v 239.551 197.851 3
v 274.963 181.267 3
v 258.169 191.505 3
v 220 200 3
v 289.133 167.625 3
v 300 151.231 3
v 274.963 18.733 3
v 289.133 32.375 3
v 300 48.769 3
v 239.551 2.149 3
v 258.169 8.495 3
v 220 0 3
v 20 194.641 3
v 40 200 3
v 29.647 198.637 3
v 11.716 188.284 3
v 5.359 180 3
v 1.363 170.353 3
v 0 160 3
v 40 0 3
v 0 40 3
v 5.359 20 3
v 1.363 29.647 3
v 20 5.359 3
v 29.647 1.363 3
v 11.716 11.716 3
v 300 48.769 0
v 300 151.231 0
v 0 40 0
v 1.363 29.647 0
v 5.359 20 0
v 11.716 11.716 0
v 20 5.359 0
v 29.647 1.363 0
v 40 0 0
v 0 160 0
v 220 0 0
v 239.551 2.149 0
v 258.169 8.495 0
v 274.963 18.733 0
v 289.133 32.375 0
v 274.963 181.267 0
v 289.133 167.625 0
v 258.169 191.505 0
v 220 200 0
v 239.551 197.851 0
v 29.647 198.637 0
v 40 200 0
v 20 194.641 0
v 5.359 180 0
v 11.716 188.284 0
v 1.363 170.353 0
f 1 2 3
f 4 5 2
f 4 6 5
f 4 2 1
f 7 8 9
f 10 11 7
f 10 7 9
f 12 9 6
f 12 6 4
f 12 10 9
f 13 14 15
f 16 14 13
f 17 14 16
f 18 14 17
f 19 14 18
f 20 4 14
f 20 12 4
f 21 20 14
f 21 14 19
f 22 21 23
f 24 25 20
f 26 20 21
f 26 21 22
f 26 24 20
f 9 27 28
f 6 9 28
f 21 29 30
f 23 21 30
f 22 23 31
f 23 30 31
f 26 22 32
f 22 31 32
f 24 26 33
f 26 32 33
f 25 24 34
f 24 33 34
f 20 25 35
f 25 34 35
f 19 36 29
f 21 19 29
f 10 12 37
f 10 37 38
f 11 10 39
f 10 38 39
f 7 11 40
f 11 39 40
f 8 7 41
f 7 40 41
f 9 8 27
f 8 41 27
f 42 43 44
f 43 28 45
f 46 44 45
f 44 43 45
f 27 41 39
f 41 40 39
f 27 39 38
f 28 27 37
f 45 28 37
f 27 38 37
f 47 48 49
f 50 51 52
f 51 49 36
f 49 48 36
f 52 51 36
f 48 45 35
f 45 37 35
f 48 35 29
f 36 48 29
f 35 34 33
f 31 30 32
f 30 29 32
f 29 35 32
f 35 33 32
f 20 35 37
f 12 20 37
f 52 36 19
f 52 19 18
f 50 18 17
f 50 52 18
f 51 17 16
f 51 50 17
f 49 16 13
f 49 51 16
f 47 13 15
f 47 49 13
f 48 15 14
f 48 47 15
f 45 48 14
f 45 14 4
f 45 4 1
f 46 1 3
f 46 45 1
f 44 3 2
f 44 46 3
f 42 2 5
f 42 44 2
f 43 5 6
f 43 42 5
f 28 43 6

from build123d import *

# Parameters (mm, degrees)
EXTRUDE_1_DEPTH         = 3
EXTRUDE_START           = -42
EXTRUDE_2_OUTLINE_W     = 3
EXTRUDE_2_OUTLINE_H     = 100
EXTRUDE_2_DEPTH         = 41
EXTRUDE_START_2         = -1
EXTRUDE_2_2_OUTLINE_R   = 2
EXTRUDE_2_2_OUTLINE_W   = 10
EXTRUDE_2_2_OUTLINE_H   = 120
EXTRUDE_2_2_OUTLINE_R_2 = 52
EXTRUDE_2_2_DEPTH       = 4
EXTRUDE_START_3         = -47
EXTRUDE_2_3_OUTLINE_W   = 3
EXTRUDE_2_3_OUTLINE_H   = 100
EXTRUDE_2_3_DEPTH       = 5
EXTRUDE_2_4_DEPTH       = 180
EXTRUDE_START_4         = -5
EXTRUDE_2_5_DEPTH       = 5
EXTRUDE_START_5         = -3
SKETCH_3_R              = 52
SKETCH_3_W              = 10
SKETCH_3_H              = 120
EXTRUDE_3_DEPTH         = 3
SKETCH_4_R              = 2
EXTRUDE_4_DEPTH         = 3
EXTRUDE_START_6         = -56
SKETCH_5_R              = 2
EXTRUDE_5_DEPTH         = 56
SKETCH_6_W              = 375.582573206
SKETCH_6_H              = 223.737414549
CUT_EXTRUDE_1_DEPTH     = 70
CUT_EXTRUDE_2_DEPTH     = 126
SKETCH_8_W              = 410.596490254
SKETCH_8_H              = 121.986596881
CUT_EXTRUDE_3_DEPTH     = 10
SKETCH_9_W              = 309.492357762
SKETCH_9_H              = 10
EXTRUDE_6_DEPTH         = 3
SKETCH_10_W             = 76.162490496
SKETCH_10_H             = 157.997962214
CUT_EXTRUDE_4_DEPTH     = 10


with BuildPart() as part:
    # 草图1 → 凸台-拉伸1 (new body)
    with BuildSketch(Plane(origin=(-1, 0, 0), x_dir=(0, 0, -1), z_dir=(1, 0, 0))):
        Polygon((33.371794872, 92.353263785), (31.902170139, 91.718942203), (33.371794872, 91.084620622), align=None)
    extrude(amount=-EXTRUDE_1_DEPTH)

    # 凸台-拉伸2: read off the stored shape, not the designer's step
    # 凸台-拉伸2 outline → 凸台-拉伸2 (add)
    with BuildSketch(Plane.XY.offset(EXTRUDE_START)):
        with Locations((-2.5, 90)):
            Rectangle(EXTRUDE_2_OUTLINE_W, EXTRUDE_2_OUTLINE_H)
    extrude(amount=EXTRUDE_2_DEPTH)

    # Extrude 2 2 outline → Extrude 2 2 (add)
    with BuildSketch(Plane.XY.offset(EXTRUDE_START_2)):
        with BuildLine():
            Line((-4, 140), (-4, 40))
            Line((-4, 40), (0, 40))
            ThreePointArc((0, 40), (11.715728753, 11.715728753), (40, 0))
            Line((40, 0), (220, 0))
            ThreePointArc((220, 0), (310, 90), (220, 180))
            Line((220, 180), (40, 180))
            ThreePointArc((40, 180), (11.715728753, 168.284271247), (0, 140))
            Line((0, 140), (-4, 140))
        make_face()
        with Locations((248.3, 165.059930776)):
            Circle(EXTRUDE_2_2_OUTLINE_R, mode=Mode.SUBTRACT)
        with Locations((28, 14)):
            Circle(EXTRUDE_2_2_OUTLINE_R, mode=Mode.SUBTRACT)
        with Locations((139.15, 14)):
            Circle(EXTRUDE_2_2_OUTLINE_R, mode=Mode.SUBTRACT)
        with Locations((27.7366, 79.2634)):
            Circle(EXTRUDE_2_2_OUTLINE_R, mode=Mode.SUBTRACT)
        with Locations((248.3, 14.940069224)):
            Circle(EXTRUDE_2_2_OUTLINE_R, mode=Mode.SUBTRACT)
        with Locations((27.7366, 104.2634)):
            Circle(EXTRUDE_2_2_OUTLINE_R, mode=Mode.SUBTRACT)
        with Locations((107.15, 90)):
            Rectangle(EXTRUDE_2_2_OUTLINE_W, EXTRUDE_2_2_OUTLINE_H, mode=Mode.SUBTRACT)
        with Locations((137.15, 90)):
            Rectangle(EXTRUDE_2_2_OUTLINE_W, EXTRUDE_2_2_OUTLINE_H, mode=Mode.SUBTRACT)
        with Locations((28, 166)):
            Circle(EXTRUDE_2_2_OUTLINE_R, mode=Mode.SUBTRACT)
        with Locations((139.15, 166)):
            Circle(EXTRUDE_2_2_OUTLINE_R, mode=Mode.SUBTRACT)
        with Locations((220, 90)):
            Circle(EXTRUDE_2_2_OUTLINE_R_2, mode=Mode.SUBTRACT)
    extrude(amount=EXTRUDE_2_2_DEPTH)

    # Extrude 2 3 outline → Extrude 2 3 (add)
    with BuildSketch(Plane.XY.offset(EXTRUDE_START_3)):
        with Locations((-2.5, 90)):
            Rectangle(EXTRUDE_2_3_OUTLINE_W, EXTRUDE_2_3_OUTLINE_H)
    extrude(amount=EXTRUDE_2_3_DEPTH)

    # Extrude 2 4 outline → Extrude 2 4 (cut)
    with BuildSketch(Plane(origin=(0, 0, 0), x_dir=(1, 0, 0), z_dir=(0, 1, 0))):
        with BuildLine():
            Line((311, 0), (311, 1))
            Line((311, 1), (-1, 1))
            ThreePointArc((-1, 1), (-0.707106781, 0.292893219), (0, 0))
            Line((0, 0), (311, 0))
        make_face()
        with BuildLine():
            Line((102.15, -4), (102.15, -3))
            Line((102.15, -3), (0, -3))
            ThreePointArc((0, -3), (-2.828427125, -1.828427125), (-4, 1))
            Line((-4, 1), (-4, 2))
            Line((-4, 2), (-5, 2))
            Line((-5, 2), (-5, -4))
            Line((-5, -4), (102.15, -4))
        make_face()
    extrude(amount=EXTRUDE_2_4_DEPTH, mode=Mode.SUBTRACT)

    # Extrude 2 5 outline → Extrude 2 5 (cut)
    with BuildSketch(Plane.YZ.offset(EXTRUDE_START_4)):
        with BuildLine():
            ThreePointArc((45, -47), (41.464466094, -45.535533906), (40, -42))
            Line((40, -42), (40, -41))
            Line((40, -41), (39, -41))
            Line((39, -41), (39, -46.999999996))
            Line((39, -46.999999996), (45, -47))
        make_face()
        with BuildLine():
            ThreePointArc((140, -42), (138.535533906, -45.535533906), (135, -47))
            Line((135, -47), (141, -46.999999996))
            Line((141, -46.999999996), (141, -41))
            Line((141, -41), (140, -41))
            Line((140, -41), (140, -42))
        make_face()
    extrude(amount=EXTRUDE_2_5_DEPTH, mode=Mode.SUBTRACT)

    # 草图3 → 凸台-拉伸3 (add)
    with BuildSketch(Plane.XY.offset(3).offset(EXTRUDE_START_5)):
        with Locations((220, 90)):
            Circle(SKETCH_3_R)
        with Locations((107.15, 90)):
            Rectangle(SKETCH_3_W, SKETCH_3_H)
        with Locations((137.15, 90)):
            Rectangle(SKETCH_3_W, SKETCH_3_H)
    extrude(amount=EXTRUDE_3_DEPTH)

    # 草图4 → 凸台-拉伸4 (add)
    with BuildSketch(Plane.XY.offset(3).offset(EXTRUDE_START_5)):
        with Locations((27.7366, 79.2634)):
            Circle(SKETCH_4_R)
        with Locations((27.7366, 104.2634)):
            Circle(SKETCH_4_R)
    extrude(amount=EXTRUDE_4_DEPTH)

    # 草图5 → 凸台-拉伸5 (add)
    with BuildSketch(Plane.XY.offset(3).offset(EXTRUDE_START_6)):
        with Locations((248.3, 14.940069224)):
            Circle(SKETCH_5_R)
        with Locations((139.15, 14)):
            Circle(SKETCH_5_R)
        with Locations((248.3, 165.059930776)):
            Circle(SKETCH_5_R)
        with Locations((139.15, 166)):
            Circle(SKETCH_5_R)
        with Locations((28, 14)):
            Circle(SKETCH_5_R)
        with Locations((28, 166)):
            Circle(SKETCH_5_R)
    extrude(amount=EXTRUDE_5_DEPTH)

    # 草图6 → 切除-拉伸1 (cut)
    with BuildSketch(Plane(origin=(0, 0, 0), x_dir=(-1, 0, 0), z_dir=(0, 0, -1))):
        with Locations((-149.296459545, 93.267829814)):
            Rectangle(SKETCH_6_W, SKETCH_6_H)
    extrude(amount=CUT_EXTRUDE_1_DEPTH, mode=Mode.SUBTRACT)

    # 草图7 → 切除-拉伸2 (cut)
    with BuildSketch(Plane.XZ.offset(-40)):
        with BuildLine():
            Line((-3.872983346, 0), (0, 0))
            Line((0, 0), (0, 3))
            ThreePointArc((0, 3), (-2.449489743, 2.16227766), (-3.872983346, 0))
        make_face()
    extrude(amount=-CUT_EXTRUDE_2_DEPTH, mode=Mode.SUBTRACT)

    # 草图8 → 切除-拉伸3 (cut)
    with BuildSketch(Plane(origin=(0, 0, 0), x_dir=(-1, 0, 0), z_dir=(0, 0, -1))):
        with Locations((-160.461750975, 150.993298441)):
            Rectangle(SKETCH_8_W, SKETCH_8_H)
    extrude(amount=-CUT_EXTRUDE_3_DEPTH, mode=Mode.SUBTRACT)

    # 草图9 → 凸台-拉伸6 (add)
    with BuildSketch(Plane(origin=(0, 0, 0), x_dir=(-1, 0, 0), z_dir=(0, 0, -1))):
        with Locations((-154.746178881, 95)):
            Rectangle(SKETCH_9_W, SKETCH_9_H)
    extrude(amount=-EXTRUDE_6_DEPTH)

    # 镜向1: part across plane


with BuildPart() as part_1:
    add(part.part)
    add(part.part.mirror(Plane(origin=(309.492357762, 100, 312.653870495), x_dir=(0, 0, 1), z_dir=(0, 1, 0))))

    # 草图10 → 切除-拉伸4 (cut)
    with BuildSketch(Plane(origin=(0, 0, 0), x_dir=(-1, 0, 0), z_dir=(0, 0, -1))):
        with Locations((-338.081245248, 107.574371838)):
            Rectangle(SKETCH_10_W, SKETCH_10_H)
    extrude(amount=-CUT_EXTRUDE_4_DEPTH, mode=Mode.SUBTRACT)


solid = part_1.part
